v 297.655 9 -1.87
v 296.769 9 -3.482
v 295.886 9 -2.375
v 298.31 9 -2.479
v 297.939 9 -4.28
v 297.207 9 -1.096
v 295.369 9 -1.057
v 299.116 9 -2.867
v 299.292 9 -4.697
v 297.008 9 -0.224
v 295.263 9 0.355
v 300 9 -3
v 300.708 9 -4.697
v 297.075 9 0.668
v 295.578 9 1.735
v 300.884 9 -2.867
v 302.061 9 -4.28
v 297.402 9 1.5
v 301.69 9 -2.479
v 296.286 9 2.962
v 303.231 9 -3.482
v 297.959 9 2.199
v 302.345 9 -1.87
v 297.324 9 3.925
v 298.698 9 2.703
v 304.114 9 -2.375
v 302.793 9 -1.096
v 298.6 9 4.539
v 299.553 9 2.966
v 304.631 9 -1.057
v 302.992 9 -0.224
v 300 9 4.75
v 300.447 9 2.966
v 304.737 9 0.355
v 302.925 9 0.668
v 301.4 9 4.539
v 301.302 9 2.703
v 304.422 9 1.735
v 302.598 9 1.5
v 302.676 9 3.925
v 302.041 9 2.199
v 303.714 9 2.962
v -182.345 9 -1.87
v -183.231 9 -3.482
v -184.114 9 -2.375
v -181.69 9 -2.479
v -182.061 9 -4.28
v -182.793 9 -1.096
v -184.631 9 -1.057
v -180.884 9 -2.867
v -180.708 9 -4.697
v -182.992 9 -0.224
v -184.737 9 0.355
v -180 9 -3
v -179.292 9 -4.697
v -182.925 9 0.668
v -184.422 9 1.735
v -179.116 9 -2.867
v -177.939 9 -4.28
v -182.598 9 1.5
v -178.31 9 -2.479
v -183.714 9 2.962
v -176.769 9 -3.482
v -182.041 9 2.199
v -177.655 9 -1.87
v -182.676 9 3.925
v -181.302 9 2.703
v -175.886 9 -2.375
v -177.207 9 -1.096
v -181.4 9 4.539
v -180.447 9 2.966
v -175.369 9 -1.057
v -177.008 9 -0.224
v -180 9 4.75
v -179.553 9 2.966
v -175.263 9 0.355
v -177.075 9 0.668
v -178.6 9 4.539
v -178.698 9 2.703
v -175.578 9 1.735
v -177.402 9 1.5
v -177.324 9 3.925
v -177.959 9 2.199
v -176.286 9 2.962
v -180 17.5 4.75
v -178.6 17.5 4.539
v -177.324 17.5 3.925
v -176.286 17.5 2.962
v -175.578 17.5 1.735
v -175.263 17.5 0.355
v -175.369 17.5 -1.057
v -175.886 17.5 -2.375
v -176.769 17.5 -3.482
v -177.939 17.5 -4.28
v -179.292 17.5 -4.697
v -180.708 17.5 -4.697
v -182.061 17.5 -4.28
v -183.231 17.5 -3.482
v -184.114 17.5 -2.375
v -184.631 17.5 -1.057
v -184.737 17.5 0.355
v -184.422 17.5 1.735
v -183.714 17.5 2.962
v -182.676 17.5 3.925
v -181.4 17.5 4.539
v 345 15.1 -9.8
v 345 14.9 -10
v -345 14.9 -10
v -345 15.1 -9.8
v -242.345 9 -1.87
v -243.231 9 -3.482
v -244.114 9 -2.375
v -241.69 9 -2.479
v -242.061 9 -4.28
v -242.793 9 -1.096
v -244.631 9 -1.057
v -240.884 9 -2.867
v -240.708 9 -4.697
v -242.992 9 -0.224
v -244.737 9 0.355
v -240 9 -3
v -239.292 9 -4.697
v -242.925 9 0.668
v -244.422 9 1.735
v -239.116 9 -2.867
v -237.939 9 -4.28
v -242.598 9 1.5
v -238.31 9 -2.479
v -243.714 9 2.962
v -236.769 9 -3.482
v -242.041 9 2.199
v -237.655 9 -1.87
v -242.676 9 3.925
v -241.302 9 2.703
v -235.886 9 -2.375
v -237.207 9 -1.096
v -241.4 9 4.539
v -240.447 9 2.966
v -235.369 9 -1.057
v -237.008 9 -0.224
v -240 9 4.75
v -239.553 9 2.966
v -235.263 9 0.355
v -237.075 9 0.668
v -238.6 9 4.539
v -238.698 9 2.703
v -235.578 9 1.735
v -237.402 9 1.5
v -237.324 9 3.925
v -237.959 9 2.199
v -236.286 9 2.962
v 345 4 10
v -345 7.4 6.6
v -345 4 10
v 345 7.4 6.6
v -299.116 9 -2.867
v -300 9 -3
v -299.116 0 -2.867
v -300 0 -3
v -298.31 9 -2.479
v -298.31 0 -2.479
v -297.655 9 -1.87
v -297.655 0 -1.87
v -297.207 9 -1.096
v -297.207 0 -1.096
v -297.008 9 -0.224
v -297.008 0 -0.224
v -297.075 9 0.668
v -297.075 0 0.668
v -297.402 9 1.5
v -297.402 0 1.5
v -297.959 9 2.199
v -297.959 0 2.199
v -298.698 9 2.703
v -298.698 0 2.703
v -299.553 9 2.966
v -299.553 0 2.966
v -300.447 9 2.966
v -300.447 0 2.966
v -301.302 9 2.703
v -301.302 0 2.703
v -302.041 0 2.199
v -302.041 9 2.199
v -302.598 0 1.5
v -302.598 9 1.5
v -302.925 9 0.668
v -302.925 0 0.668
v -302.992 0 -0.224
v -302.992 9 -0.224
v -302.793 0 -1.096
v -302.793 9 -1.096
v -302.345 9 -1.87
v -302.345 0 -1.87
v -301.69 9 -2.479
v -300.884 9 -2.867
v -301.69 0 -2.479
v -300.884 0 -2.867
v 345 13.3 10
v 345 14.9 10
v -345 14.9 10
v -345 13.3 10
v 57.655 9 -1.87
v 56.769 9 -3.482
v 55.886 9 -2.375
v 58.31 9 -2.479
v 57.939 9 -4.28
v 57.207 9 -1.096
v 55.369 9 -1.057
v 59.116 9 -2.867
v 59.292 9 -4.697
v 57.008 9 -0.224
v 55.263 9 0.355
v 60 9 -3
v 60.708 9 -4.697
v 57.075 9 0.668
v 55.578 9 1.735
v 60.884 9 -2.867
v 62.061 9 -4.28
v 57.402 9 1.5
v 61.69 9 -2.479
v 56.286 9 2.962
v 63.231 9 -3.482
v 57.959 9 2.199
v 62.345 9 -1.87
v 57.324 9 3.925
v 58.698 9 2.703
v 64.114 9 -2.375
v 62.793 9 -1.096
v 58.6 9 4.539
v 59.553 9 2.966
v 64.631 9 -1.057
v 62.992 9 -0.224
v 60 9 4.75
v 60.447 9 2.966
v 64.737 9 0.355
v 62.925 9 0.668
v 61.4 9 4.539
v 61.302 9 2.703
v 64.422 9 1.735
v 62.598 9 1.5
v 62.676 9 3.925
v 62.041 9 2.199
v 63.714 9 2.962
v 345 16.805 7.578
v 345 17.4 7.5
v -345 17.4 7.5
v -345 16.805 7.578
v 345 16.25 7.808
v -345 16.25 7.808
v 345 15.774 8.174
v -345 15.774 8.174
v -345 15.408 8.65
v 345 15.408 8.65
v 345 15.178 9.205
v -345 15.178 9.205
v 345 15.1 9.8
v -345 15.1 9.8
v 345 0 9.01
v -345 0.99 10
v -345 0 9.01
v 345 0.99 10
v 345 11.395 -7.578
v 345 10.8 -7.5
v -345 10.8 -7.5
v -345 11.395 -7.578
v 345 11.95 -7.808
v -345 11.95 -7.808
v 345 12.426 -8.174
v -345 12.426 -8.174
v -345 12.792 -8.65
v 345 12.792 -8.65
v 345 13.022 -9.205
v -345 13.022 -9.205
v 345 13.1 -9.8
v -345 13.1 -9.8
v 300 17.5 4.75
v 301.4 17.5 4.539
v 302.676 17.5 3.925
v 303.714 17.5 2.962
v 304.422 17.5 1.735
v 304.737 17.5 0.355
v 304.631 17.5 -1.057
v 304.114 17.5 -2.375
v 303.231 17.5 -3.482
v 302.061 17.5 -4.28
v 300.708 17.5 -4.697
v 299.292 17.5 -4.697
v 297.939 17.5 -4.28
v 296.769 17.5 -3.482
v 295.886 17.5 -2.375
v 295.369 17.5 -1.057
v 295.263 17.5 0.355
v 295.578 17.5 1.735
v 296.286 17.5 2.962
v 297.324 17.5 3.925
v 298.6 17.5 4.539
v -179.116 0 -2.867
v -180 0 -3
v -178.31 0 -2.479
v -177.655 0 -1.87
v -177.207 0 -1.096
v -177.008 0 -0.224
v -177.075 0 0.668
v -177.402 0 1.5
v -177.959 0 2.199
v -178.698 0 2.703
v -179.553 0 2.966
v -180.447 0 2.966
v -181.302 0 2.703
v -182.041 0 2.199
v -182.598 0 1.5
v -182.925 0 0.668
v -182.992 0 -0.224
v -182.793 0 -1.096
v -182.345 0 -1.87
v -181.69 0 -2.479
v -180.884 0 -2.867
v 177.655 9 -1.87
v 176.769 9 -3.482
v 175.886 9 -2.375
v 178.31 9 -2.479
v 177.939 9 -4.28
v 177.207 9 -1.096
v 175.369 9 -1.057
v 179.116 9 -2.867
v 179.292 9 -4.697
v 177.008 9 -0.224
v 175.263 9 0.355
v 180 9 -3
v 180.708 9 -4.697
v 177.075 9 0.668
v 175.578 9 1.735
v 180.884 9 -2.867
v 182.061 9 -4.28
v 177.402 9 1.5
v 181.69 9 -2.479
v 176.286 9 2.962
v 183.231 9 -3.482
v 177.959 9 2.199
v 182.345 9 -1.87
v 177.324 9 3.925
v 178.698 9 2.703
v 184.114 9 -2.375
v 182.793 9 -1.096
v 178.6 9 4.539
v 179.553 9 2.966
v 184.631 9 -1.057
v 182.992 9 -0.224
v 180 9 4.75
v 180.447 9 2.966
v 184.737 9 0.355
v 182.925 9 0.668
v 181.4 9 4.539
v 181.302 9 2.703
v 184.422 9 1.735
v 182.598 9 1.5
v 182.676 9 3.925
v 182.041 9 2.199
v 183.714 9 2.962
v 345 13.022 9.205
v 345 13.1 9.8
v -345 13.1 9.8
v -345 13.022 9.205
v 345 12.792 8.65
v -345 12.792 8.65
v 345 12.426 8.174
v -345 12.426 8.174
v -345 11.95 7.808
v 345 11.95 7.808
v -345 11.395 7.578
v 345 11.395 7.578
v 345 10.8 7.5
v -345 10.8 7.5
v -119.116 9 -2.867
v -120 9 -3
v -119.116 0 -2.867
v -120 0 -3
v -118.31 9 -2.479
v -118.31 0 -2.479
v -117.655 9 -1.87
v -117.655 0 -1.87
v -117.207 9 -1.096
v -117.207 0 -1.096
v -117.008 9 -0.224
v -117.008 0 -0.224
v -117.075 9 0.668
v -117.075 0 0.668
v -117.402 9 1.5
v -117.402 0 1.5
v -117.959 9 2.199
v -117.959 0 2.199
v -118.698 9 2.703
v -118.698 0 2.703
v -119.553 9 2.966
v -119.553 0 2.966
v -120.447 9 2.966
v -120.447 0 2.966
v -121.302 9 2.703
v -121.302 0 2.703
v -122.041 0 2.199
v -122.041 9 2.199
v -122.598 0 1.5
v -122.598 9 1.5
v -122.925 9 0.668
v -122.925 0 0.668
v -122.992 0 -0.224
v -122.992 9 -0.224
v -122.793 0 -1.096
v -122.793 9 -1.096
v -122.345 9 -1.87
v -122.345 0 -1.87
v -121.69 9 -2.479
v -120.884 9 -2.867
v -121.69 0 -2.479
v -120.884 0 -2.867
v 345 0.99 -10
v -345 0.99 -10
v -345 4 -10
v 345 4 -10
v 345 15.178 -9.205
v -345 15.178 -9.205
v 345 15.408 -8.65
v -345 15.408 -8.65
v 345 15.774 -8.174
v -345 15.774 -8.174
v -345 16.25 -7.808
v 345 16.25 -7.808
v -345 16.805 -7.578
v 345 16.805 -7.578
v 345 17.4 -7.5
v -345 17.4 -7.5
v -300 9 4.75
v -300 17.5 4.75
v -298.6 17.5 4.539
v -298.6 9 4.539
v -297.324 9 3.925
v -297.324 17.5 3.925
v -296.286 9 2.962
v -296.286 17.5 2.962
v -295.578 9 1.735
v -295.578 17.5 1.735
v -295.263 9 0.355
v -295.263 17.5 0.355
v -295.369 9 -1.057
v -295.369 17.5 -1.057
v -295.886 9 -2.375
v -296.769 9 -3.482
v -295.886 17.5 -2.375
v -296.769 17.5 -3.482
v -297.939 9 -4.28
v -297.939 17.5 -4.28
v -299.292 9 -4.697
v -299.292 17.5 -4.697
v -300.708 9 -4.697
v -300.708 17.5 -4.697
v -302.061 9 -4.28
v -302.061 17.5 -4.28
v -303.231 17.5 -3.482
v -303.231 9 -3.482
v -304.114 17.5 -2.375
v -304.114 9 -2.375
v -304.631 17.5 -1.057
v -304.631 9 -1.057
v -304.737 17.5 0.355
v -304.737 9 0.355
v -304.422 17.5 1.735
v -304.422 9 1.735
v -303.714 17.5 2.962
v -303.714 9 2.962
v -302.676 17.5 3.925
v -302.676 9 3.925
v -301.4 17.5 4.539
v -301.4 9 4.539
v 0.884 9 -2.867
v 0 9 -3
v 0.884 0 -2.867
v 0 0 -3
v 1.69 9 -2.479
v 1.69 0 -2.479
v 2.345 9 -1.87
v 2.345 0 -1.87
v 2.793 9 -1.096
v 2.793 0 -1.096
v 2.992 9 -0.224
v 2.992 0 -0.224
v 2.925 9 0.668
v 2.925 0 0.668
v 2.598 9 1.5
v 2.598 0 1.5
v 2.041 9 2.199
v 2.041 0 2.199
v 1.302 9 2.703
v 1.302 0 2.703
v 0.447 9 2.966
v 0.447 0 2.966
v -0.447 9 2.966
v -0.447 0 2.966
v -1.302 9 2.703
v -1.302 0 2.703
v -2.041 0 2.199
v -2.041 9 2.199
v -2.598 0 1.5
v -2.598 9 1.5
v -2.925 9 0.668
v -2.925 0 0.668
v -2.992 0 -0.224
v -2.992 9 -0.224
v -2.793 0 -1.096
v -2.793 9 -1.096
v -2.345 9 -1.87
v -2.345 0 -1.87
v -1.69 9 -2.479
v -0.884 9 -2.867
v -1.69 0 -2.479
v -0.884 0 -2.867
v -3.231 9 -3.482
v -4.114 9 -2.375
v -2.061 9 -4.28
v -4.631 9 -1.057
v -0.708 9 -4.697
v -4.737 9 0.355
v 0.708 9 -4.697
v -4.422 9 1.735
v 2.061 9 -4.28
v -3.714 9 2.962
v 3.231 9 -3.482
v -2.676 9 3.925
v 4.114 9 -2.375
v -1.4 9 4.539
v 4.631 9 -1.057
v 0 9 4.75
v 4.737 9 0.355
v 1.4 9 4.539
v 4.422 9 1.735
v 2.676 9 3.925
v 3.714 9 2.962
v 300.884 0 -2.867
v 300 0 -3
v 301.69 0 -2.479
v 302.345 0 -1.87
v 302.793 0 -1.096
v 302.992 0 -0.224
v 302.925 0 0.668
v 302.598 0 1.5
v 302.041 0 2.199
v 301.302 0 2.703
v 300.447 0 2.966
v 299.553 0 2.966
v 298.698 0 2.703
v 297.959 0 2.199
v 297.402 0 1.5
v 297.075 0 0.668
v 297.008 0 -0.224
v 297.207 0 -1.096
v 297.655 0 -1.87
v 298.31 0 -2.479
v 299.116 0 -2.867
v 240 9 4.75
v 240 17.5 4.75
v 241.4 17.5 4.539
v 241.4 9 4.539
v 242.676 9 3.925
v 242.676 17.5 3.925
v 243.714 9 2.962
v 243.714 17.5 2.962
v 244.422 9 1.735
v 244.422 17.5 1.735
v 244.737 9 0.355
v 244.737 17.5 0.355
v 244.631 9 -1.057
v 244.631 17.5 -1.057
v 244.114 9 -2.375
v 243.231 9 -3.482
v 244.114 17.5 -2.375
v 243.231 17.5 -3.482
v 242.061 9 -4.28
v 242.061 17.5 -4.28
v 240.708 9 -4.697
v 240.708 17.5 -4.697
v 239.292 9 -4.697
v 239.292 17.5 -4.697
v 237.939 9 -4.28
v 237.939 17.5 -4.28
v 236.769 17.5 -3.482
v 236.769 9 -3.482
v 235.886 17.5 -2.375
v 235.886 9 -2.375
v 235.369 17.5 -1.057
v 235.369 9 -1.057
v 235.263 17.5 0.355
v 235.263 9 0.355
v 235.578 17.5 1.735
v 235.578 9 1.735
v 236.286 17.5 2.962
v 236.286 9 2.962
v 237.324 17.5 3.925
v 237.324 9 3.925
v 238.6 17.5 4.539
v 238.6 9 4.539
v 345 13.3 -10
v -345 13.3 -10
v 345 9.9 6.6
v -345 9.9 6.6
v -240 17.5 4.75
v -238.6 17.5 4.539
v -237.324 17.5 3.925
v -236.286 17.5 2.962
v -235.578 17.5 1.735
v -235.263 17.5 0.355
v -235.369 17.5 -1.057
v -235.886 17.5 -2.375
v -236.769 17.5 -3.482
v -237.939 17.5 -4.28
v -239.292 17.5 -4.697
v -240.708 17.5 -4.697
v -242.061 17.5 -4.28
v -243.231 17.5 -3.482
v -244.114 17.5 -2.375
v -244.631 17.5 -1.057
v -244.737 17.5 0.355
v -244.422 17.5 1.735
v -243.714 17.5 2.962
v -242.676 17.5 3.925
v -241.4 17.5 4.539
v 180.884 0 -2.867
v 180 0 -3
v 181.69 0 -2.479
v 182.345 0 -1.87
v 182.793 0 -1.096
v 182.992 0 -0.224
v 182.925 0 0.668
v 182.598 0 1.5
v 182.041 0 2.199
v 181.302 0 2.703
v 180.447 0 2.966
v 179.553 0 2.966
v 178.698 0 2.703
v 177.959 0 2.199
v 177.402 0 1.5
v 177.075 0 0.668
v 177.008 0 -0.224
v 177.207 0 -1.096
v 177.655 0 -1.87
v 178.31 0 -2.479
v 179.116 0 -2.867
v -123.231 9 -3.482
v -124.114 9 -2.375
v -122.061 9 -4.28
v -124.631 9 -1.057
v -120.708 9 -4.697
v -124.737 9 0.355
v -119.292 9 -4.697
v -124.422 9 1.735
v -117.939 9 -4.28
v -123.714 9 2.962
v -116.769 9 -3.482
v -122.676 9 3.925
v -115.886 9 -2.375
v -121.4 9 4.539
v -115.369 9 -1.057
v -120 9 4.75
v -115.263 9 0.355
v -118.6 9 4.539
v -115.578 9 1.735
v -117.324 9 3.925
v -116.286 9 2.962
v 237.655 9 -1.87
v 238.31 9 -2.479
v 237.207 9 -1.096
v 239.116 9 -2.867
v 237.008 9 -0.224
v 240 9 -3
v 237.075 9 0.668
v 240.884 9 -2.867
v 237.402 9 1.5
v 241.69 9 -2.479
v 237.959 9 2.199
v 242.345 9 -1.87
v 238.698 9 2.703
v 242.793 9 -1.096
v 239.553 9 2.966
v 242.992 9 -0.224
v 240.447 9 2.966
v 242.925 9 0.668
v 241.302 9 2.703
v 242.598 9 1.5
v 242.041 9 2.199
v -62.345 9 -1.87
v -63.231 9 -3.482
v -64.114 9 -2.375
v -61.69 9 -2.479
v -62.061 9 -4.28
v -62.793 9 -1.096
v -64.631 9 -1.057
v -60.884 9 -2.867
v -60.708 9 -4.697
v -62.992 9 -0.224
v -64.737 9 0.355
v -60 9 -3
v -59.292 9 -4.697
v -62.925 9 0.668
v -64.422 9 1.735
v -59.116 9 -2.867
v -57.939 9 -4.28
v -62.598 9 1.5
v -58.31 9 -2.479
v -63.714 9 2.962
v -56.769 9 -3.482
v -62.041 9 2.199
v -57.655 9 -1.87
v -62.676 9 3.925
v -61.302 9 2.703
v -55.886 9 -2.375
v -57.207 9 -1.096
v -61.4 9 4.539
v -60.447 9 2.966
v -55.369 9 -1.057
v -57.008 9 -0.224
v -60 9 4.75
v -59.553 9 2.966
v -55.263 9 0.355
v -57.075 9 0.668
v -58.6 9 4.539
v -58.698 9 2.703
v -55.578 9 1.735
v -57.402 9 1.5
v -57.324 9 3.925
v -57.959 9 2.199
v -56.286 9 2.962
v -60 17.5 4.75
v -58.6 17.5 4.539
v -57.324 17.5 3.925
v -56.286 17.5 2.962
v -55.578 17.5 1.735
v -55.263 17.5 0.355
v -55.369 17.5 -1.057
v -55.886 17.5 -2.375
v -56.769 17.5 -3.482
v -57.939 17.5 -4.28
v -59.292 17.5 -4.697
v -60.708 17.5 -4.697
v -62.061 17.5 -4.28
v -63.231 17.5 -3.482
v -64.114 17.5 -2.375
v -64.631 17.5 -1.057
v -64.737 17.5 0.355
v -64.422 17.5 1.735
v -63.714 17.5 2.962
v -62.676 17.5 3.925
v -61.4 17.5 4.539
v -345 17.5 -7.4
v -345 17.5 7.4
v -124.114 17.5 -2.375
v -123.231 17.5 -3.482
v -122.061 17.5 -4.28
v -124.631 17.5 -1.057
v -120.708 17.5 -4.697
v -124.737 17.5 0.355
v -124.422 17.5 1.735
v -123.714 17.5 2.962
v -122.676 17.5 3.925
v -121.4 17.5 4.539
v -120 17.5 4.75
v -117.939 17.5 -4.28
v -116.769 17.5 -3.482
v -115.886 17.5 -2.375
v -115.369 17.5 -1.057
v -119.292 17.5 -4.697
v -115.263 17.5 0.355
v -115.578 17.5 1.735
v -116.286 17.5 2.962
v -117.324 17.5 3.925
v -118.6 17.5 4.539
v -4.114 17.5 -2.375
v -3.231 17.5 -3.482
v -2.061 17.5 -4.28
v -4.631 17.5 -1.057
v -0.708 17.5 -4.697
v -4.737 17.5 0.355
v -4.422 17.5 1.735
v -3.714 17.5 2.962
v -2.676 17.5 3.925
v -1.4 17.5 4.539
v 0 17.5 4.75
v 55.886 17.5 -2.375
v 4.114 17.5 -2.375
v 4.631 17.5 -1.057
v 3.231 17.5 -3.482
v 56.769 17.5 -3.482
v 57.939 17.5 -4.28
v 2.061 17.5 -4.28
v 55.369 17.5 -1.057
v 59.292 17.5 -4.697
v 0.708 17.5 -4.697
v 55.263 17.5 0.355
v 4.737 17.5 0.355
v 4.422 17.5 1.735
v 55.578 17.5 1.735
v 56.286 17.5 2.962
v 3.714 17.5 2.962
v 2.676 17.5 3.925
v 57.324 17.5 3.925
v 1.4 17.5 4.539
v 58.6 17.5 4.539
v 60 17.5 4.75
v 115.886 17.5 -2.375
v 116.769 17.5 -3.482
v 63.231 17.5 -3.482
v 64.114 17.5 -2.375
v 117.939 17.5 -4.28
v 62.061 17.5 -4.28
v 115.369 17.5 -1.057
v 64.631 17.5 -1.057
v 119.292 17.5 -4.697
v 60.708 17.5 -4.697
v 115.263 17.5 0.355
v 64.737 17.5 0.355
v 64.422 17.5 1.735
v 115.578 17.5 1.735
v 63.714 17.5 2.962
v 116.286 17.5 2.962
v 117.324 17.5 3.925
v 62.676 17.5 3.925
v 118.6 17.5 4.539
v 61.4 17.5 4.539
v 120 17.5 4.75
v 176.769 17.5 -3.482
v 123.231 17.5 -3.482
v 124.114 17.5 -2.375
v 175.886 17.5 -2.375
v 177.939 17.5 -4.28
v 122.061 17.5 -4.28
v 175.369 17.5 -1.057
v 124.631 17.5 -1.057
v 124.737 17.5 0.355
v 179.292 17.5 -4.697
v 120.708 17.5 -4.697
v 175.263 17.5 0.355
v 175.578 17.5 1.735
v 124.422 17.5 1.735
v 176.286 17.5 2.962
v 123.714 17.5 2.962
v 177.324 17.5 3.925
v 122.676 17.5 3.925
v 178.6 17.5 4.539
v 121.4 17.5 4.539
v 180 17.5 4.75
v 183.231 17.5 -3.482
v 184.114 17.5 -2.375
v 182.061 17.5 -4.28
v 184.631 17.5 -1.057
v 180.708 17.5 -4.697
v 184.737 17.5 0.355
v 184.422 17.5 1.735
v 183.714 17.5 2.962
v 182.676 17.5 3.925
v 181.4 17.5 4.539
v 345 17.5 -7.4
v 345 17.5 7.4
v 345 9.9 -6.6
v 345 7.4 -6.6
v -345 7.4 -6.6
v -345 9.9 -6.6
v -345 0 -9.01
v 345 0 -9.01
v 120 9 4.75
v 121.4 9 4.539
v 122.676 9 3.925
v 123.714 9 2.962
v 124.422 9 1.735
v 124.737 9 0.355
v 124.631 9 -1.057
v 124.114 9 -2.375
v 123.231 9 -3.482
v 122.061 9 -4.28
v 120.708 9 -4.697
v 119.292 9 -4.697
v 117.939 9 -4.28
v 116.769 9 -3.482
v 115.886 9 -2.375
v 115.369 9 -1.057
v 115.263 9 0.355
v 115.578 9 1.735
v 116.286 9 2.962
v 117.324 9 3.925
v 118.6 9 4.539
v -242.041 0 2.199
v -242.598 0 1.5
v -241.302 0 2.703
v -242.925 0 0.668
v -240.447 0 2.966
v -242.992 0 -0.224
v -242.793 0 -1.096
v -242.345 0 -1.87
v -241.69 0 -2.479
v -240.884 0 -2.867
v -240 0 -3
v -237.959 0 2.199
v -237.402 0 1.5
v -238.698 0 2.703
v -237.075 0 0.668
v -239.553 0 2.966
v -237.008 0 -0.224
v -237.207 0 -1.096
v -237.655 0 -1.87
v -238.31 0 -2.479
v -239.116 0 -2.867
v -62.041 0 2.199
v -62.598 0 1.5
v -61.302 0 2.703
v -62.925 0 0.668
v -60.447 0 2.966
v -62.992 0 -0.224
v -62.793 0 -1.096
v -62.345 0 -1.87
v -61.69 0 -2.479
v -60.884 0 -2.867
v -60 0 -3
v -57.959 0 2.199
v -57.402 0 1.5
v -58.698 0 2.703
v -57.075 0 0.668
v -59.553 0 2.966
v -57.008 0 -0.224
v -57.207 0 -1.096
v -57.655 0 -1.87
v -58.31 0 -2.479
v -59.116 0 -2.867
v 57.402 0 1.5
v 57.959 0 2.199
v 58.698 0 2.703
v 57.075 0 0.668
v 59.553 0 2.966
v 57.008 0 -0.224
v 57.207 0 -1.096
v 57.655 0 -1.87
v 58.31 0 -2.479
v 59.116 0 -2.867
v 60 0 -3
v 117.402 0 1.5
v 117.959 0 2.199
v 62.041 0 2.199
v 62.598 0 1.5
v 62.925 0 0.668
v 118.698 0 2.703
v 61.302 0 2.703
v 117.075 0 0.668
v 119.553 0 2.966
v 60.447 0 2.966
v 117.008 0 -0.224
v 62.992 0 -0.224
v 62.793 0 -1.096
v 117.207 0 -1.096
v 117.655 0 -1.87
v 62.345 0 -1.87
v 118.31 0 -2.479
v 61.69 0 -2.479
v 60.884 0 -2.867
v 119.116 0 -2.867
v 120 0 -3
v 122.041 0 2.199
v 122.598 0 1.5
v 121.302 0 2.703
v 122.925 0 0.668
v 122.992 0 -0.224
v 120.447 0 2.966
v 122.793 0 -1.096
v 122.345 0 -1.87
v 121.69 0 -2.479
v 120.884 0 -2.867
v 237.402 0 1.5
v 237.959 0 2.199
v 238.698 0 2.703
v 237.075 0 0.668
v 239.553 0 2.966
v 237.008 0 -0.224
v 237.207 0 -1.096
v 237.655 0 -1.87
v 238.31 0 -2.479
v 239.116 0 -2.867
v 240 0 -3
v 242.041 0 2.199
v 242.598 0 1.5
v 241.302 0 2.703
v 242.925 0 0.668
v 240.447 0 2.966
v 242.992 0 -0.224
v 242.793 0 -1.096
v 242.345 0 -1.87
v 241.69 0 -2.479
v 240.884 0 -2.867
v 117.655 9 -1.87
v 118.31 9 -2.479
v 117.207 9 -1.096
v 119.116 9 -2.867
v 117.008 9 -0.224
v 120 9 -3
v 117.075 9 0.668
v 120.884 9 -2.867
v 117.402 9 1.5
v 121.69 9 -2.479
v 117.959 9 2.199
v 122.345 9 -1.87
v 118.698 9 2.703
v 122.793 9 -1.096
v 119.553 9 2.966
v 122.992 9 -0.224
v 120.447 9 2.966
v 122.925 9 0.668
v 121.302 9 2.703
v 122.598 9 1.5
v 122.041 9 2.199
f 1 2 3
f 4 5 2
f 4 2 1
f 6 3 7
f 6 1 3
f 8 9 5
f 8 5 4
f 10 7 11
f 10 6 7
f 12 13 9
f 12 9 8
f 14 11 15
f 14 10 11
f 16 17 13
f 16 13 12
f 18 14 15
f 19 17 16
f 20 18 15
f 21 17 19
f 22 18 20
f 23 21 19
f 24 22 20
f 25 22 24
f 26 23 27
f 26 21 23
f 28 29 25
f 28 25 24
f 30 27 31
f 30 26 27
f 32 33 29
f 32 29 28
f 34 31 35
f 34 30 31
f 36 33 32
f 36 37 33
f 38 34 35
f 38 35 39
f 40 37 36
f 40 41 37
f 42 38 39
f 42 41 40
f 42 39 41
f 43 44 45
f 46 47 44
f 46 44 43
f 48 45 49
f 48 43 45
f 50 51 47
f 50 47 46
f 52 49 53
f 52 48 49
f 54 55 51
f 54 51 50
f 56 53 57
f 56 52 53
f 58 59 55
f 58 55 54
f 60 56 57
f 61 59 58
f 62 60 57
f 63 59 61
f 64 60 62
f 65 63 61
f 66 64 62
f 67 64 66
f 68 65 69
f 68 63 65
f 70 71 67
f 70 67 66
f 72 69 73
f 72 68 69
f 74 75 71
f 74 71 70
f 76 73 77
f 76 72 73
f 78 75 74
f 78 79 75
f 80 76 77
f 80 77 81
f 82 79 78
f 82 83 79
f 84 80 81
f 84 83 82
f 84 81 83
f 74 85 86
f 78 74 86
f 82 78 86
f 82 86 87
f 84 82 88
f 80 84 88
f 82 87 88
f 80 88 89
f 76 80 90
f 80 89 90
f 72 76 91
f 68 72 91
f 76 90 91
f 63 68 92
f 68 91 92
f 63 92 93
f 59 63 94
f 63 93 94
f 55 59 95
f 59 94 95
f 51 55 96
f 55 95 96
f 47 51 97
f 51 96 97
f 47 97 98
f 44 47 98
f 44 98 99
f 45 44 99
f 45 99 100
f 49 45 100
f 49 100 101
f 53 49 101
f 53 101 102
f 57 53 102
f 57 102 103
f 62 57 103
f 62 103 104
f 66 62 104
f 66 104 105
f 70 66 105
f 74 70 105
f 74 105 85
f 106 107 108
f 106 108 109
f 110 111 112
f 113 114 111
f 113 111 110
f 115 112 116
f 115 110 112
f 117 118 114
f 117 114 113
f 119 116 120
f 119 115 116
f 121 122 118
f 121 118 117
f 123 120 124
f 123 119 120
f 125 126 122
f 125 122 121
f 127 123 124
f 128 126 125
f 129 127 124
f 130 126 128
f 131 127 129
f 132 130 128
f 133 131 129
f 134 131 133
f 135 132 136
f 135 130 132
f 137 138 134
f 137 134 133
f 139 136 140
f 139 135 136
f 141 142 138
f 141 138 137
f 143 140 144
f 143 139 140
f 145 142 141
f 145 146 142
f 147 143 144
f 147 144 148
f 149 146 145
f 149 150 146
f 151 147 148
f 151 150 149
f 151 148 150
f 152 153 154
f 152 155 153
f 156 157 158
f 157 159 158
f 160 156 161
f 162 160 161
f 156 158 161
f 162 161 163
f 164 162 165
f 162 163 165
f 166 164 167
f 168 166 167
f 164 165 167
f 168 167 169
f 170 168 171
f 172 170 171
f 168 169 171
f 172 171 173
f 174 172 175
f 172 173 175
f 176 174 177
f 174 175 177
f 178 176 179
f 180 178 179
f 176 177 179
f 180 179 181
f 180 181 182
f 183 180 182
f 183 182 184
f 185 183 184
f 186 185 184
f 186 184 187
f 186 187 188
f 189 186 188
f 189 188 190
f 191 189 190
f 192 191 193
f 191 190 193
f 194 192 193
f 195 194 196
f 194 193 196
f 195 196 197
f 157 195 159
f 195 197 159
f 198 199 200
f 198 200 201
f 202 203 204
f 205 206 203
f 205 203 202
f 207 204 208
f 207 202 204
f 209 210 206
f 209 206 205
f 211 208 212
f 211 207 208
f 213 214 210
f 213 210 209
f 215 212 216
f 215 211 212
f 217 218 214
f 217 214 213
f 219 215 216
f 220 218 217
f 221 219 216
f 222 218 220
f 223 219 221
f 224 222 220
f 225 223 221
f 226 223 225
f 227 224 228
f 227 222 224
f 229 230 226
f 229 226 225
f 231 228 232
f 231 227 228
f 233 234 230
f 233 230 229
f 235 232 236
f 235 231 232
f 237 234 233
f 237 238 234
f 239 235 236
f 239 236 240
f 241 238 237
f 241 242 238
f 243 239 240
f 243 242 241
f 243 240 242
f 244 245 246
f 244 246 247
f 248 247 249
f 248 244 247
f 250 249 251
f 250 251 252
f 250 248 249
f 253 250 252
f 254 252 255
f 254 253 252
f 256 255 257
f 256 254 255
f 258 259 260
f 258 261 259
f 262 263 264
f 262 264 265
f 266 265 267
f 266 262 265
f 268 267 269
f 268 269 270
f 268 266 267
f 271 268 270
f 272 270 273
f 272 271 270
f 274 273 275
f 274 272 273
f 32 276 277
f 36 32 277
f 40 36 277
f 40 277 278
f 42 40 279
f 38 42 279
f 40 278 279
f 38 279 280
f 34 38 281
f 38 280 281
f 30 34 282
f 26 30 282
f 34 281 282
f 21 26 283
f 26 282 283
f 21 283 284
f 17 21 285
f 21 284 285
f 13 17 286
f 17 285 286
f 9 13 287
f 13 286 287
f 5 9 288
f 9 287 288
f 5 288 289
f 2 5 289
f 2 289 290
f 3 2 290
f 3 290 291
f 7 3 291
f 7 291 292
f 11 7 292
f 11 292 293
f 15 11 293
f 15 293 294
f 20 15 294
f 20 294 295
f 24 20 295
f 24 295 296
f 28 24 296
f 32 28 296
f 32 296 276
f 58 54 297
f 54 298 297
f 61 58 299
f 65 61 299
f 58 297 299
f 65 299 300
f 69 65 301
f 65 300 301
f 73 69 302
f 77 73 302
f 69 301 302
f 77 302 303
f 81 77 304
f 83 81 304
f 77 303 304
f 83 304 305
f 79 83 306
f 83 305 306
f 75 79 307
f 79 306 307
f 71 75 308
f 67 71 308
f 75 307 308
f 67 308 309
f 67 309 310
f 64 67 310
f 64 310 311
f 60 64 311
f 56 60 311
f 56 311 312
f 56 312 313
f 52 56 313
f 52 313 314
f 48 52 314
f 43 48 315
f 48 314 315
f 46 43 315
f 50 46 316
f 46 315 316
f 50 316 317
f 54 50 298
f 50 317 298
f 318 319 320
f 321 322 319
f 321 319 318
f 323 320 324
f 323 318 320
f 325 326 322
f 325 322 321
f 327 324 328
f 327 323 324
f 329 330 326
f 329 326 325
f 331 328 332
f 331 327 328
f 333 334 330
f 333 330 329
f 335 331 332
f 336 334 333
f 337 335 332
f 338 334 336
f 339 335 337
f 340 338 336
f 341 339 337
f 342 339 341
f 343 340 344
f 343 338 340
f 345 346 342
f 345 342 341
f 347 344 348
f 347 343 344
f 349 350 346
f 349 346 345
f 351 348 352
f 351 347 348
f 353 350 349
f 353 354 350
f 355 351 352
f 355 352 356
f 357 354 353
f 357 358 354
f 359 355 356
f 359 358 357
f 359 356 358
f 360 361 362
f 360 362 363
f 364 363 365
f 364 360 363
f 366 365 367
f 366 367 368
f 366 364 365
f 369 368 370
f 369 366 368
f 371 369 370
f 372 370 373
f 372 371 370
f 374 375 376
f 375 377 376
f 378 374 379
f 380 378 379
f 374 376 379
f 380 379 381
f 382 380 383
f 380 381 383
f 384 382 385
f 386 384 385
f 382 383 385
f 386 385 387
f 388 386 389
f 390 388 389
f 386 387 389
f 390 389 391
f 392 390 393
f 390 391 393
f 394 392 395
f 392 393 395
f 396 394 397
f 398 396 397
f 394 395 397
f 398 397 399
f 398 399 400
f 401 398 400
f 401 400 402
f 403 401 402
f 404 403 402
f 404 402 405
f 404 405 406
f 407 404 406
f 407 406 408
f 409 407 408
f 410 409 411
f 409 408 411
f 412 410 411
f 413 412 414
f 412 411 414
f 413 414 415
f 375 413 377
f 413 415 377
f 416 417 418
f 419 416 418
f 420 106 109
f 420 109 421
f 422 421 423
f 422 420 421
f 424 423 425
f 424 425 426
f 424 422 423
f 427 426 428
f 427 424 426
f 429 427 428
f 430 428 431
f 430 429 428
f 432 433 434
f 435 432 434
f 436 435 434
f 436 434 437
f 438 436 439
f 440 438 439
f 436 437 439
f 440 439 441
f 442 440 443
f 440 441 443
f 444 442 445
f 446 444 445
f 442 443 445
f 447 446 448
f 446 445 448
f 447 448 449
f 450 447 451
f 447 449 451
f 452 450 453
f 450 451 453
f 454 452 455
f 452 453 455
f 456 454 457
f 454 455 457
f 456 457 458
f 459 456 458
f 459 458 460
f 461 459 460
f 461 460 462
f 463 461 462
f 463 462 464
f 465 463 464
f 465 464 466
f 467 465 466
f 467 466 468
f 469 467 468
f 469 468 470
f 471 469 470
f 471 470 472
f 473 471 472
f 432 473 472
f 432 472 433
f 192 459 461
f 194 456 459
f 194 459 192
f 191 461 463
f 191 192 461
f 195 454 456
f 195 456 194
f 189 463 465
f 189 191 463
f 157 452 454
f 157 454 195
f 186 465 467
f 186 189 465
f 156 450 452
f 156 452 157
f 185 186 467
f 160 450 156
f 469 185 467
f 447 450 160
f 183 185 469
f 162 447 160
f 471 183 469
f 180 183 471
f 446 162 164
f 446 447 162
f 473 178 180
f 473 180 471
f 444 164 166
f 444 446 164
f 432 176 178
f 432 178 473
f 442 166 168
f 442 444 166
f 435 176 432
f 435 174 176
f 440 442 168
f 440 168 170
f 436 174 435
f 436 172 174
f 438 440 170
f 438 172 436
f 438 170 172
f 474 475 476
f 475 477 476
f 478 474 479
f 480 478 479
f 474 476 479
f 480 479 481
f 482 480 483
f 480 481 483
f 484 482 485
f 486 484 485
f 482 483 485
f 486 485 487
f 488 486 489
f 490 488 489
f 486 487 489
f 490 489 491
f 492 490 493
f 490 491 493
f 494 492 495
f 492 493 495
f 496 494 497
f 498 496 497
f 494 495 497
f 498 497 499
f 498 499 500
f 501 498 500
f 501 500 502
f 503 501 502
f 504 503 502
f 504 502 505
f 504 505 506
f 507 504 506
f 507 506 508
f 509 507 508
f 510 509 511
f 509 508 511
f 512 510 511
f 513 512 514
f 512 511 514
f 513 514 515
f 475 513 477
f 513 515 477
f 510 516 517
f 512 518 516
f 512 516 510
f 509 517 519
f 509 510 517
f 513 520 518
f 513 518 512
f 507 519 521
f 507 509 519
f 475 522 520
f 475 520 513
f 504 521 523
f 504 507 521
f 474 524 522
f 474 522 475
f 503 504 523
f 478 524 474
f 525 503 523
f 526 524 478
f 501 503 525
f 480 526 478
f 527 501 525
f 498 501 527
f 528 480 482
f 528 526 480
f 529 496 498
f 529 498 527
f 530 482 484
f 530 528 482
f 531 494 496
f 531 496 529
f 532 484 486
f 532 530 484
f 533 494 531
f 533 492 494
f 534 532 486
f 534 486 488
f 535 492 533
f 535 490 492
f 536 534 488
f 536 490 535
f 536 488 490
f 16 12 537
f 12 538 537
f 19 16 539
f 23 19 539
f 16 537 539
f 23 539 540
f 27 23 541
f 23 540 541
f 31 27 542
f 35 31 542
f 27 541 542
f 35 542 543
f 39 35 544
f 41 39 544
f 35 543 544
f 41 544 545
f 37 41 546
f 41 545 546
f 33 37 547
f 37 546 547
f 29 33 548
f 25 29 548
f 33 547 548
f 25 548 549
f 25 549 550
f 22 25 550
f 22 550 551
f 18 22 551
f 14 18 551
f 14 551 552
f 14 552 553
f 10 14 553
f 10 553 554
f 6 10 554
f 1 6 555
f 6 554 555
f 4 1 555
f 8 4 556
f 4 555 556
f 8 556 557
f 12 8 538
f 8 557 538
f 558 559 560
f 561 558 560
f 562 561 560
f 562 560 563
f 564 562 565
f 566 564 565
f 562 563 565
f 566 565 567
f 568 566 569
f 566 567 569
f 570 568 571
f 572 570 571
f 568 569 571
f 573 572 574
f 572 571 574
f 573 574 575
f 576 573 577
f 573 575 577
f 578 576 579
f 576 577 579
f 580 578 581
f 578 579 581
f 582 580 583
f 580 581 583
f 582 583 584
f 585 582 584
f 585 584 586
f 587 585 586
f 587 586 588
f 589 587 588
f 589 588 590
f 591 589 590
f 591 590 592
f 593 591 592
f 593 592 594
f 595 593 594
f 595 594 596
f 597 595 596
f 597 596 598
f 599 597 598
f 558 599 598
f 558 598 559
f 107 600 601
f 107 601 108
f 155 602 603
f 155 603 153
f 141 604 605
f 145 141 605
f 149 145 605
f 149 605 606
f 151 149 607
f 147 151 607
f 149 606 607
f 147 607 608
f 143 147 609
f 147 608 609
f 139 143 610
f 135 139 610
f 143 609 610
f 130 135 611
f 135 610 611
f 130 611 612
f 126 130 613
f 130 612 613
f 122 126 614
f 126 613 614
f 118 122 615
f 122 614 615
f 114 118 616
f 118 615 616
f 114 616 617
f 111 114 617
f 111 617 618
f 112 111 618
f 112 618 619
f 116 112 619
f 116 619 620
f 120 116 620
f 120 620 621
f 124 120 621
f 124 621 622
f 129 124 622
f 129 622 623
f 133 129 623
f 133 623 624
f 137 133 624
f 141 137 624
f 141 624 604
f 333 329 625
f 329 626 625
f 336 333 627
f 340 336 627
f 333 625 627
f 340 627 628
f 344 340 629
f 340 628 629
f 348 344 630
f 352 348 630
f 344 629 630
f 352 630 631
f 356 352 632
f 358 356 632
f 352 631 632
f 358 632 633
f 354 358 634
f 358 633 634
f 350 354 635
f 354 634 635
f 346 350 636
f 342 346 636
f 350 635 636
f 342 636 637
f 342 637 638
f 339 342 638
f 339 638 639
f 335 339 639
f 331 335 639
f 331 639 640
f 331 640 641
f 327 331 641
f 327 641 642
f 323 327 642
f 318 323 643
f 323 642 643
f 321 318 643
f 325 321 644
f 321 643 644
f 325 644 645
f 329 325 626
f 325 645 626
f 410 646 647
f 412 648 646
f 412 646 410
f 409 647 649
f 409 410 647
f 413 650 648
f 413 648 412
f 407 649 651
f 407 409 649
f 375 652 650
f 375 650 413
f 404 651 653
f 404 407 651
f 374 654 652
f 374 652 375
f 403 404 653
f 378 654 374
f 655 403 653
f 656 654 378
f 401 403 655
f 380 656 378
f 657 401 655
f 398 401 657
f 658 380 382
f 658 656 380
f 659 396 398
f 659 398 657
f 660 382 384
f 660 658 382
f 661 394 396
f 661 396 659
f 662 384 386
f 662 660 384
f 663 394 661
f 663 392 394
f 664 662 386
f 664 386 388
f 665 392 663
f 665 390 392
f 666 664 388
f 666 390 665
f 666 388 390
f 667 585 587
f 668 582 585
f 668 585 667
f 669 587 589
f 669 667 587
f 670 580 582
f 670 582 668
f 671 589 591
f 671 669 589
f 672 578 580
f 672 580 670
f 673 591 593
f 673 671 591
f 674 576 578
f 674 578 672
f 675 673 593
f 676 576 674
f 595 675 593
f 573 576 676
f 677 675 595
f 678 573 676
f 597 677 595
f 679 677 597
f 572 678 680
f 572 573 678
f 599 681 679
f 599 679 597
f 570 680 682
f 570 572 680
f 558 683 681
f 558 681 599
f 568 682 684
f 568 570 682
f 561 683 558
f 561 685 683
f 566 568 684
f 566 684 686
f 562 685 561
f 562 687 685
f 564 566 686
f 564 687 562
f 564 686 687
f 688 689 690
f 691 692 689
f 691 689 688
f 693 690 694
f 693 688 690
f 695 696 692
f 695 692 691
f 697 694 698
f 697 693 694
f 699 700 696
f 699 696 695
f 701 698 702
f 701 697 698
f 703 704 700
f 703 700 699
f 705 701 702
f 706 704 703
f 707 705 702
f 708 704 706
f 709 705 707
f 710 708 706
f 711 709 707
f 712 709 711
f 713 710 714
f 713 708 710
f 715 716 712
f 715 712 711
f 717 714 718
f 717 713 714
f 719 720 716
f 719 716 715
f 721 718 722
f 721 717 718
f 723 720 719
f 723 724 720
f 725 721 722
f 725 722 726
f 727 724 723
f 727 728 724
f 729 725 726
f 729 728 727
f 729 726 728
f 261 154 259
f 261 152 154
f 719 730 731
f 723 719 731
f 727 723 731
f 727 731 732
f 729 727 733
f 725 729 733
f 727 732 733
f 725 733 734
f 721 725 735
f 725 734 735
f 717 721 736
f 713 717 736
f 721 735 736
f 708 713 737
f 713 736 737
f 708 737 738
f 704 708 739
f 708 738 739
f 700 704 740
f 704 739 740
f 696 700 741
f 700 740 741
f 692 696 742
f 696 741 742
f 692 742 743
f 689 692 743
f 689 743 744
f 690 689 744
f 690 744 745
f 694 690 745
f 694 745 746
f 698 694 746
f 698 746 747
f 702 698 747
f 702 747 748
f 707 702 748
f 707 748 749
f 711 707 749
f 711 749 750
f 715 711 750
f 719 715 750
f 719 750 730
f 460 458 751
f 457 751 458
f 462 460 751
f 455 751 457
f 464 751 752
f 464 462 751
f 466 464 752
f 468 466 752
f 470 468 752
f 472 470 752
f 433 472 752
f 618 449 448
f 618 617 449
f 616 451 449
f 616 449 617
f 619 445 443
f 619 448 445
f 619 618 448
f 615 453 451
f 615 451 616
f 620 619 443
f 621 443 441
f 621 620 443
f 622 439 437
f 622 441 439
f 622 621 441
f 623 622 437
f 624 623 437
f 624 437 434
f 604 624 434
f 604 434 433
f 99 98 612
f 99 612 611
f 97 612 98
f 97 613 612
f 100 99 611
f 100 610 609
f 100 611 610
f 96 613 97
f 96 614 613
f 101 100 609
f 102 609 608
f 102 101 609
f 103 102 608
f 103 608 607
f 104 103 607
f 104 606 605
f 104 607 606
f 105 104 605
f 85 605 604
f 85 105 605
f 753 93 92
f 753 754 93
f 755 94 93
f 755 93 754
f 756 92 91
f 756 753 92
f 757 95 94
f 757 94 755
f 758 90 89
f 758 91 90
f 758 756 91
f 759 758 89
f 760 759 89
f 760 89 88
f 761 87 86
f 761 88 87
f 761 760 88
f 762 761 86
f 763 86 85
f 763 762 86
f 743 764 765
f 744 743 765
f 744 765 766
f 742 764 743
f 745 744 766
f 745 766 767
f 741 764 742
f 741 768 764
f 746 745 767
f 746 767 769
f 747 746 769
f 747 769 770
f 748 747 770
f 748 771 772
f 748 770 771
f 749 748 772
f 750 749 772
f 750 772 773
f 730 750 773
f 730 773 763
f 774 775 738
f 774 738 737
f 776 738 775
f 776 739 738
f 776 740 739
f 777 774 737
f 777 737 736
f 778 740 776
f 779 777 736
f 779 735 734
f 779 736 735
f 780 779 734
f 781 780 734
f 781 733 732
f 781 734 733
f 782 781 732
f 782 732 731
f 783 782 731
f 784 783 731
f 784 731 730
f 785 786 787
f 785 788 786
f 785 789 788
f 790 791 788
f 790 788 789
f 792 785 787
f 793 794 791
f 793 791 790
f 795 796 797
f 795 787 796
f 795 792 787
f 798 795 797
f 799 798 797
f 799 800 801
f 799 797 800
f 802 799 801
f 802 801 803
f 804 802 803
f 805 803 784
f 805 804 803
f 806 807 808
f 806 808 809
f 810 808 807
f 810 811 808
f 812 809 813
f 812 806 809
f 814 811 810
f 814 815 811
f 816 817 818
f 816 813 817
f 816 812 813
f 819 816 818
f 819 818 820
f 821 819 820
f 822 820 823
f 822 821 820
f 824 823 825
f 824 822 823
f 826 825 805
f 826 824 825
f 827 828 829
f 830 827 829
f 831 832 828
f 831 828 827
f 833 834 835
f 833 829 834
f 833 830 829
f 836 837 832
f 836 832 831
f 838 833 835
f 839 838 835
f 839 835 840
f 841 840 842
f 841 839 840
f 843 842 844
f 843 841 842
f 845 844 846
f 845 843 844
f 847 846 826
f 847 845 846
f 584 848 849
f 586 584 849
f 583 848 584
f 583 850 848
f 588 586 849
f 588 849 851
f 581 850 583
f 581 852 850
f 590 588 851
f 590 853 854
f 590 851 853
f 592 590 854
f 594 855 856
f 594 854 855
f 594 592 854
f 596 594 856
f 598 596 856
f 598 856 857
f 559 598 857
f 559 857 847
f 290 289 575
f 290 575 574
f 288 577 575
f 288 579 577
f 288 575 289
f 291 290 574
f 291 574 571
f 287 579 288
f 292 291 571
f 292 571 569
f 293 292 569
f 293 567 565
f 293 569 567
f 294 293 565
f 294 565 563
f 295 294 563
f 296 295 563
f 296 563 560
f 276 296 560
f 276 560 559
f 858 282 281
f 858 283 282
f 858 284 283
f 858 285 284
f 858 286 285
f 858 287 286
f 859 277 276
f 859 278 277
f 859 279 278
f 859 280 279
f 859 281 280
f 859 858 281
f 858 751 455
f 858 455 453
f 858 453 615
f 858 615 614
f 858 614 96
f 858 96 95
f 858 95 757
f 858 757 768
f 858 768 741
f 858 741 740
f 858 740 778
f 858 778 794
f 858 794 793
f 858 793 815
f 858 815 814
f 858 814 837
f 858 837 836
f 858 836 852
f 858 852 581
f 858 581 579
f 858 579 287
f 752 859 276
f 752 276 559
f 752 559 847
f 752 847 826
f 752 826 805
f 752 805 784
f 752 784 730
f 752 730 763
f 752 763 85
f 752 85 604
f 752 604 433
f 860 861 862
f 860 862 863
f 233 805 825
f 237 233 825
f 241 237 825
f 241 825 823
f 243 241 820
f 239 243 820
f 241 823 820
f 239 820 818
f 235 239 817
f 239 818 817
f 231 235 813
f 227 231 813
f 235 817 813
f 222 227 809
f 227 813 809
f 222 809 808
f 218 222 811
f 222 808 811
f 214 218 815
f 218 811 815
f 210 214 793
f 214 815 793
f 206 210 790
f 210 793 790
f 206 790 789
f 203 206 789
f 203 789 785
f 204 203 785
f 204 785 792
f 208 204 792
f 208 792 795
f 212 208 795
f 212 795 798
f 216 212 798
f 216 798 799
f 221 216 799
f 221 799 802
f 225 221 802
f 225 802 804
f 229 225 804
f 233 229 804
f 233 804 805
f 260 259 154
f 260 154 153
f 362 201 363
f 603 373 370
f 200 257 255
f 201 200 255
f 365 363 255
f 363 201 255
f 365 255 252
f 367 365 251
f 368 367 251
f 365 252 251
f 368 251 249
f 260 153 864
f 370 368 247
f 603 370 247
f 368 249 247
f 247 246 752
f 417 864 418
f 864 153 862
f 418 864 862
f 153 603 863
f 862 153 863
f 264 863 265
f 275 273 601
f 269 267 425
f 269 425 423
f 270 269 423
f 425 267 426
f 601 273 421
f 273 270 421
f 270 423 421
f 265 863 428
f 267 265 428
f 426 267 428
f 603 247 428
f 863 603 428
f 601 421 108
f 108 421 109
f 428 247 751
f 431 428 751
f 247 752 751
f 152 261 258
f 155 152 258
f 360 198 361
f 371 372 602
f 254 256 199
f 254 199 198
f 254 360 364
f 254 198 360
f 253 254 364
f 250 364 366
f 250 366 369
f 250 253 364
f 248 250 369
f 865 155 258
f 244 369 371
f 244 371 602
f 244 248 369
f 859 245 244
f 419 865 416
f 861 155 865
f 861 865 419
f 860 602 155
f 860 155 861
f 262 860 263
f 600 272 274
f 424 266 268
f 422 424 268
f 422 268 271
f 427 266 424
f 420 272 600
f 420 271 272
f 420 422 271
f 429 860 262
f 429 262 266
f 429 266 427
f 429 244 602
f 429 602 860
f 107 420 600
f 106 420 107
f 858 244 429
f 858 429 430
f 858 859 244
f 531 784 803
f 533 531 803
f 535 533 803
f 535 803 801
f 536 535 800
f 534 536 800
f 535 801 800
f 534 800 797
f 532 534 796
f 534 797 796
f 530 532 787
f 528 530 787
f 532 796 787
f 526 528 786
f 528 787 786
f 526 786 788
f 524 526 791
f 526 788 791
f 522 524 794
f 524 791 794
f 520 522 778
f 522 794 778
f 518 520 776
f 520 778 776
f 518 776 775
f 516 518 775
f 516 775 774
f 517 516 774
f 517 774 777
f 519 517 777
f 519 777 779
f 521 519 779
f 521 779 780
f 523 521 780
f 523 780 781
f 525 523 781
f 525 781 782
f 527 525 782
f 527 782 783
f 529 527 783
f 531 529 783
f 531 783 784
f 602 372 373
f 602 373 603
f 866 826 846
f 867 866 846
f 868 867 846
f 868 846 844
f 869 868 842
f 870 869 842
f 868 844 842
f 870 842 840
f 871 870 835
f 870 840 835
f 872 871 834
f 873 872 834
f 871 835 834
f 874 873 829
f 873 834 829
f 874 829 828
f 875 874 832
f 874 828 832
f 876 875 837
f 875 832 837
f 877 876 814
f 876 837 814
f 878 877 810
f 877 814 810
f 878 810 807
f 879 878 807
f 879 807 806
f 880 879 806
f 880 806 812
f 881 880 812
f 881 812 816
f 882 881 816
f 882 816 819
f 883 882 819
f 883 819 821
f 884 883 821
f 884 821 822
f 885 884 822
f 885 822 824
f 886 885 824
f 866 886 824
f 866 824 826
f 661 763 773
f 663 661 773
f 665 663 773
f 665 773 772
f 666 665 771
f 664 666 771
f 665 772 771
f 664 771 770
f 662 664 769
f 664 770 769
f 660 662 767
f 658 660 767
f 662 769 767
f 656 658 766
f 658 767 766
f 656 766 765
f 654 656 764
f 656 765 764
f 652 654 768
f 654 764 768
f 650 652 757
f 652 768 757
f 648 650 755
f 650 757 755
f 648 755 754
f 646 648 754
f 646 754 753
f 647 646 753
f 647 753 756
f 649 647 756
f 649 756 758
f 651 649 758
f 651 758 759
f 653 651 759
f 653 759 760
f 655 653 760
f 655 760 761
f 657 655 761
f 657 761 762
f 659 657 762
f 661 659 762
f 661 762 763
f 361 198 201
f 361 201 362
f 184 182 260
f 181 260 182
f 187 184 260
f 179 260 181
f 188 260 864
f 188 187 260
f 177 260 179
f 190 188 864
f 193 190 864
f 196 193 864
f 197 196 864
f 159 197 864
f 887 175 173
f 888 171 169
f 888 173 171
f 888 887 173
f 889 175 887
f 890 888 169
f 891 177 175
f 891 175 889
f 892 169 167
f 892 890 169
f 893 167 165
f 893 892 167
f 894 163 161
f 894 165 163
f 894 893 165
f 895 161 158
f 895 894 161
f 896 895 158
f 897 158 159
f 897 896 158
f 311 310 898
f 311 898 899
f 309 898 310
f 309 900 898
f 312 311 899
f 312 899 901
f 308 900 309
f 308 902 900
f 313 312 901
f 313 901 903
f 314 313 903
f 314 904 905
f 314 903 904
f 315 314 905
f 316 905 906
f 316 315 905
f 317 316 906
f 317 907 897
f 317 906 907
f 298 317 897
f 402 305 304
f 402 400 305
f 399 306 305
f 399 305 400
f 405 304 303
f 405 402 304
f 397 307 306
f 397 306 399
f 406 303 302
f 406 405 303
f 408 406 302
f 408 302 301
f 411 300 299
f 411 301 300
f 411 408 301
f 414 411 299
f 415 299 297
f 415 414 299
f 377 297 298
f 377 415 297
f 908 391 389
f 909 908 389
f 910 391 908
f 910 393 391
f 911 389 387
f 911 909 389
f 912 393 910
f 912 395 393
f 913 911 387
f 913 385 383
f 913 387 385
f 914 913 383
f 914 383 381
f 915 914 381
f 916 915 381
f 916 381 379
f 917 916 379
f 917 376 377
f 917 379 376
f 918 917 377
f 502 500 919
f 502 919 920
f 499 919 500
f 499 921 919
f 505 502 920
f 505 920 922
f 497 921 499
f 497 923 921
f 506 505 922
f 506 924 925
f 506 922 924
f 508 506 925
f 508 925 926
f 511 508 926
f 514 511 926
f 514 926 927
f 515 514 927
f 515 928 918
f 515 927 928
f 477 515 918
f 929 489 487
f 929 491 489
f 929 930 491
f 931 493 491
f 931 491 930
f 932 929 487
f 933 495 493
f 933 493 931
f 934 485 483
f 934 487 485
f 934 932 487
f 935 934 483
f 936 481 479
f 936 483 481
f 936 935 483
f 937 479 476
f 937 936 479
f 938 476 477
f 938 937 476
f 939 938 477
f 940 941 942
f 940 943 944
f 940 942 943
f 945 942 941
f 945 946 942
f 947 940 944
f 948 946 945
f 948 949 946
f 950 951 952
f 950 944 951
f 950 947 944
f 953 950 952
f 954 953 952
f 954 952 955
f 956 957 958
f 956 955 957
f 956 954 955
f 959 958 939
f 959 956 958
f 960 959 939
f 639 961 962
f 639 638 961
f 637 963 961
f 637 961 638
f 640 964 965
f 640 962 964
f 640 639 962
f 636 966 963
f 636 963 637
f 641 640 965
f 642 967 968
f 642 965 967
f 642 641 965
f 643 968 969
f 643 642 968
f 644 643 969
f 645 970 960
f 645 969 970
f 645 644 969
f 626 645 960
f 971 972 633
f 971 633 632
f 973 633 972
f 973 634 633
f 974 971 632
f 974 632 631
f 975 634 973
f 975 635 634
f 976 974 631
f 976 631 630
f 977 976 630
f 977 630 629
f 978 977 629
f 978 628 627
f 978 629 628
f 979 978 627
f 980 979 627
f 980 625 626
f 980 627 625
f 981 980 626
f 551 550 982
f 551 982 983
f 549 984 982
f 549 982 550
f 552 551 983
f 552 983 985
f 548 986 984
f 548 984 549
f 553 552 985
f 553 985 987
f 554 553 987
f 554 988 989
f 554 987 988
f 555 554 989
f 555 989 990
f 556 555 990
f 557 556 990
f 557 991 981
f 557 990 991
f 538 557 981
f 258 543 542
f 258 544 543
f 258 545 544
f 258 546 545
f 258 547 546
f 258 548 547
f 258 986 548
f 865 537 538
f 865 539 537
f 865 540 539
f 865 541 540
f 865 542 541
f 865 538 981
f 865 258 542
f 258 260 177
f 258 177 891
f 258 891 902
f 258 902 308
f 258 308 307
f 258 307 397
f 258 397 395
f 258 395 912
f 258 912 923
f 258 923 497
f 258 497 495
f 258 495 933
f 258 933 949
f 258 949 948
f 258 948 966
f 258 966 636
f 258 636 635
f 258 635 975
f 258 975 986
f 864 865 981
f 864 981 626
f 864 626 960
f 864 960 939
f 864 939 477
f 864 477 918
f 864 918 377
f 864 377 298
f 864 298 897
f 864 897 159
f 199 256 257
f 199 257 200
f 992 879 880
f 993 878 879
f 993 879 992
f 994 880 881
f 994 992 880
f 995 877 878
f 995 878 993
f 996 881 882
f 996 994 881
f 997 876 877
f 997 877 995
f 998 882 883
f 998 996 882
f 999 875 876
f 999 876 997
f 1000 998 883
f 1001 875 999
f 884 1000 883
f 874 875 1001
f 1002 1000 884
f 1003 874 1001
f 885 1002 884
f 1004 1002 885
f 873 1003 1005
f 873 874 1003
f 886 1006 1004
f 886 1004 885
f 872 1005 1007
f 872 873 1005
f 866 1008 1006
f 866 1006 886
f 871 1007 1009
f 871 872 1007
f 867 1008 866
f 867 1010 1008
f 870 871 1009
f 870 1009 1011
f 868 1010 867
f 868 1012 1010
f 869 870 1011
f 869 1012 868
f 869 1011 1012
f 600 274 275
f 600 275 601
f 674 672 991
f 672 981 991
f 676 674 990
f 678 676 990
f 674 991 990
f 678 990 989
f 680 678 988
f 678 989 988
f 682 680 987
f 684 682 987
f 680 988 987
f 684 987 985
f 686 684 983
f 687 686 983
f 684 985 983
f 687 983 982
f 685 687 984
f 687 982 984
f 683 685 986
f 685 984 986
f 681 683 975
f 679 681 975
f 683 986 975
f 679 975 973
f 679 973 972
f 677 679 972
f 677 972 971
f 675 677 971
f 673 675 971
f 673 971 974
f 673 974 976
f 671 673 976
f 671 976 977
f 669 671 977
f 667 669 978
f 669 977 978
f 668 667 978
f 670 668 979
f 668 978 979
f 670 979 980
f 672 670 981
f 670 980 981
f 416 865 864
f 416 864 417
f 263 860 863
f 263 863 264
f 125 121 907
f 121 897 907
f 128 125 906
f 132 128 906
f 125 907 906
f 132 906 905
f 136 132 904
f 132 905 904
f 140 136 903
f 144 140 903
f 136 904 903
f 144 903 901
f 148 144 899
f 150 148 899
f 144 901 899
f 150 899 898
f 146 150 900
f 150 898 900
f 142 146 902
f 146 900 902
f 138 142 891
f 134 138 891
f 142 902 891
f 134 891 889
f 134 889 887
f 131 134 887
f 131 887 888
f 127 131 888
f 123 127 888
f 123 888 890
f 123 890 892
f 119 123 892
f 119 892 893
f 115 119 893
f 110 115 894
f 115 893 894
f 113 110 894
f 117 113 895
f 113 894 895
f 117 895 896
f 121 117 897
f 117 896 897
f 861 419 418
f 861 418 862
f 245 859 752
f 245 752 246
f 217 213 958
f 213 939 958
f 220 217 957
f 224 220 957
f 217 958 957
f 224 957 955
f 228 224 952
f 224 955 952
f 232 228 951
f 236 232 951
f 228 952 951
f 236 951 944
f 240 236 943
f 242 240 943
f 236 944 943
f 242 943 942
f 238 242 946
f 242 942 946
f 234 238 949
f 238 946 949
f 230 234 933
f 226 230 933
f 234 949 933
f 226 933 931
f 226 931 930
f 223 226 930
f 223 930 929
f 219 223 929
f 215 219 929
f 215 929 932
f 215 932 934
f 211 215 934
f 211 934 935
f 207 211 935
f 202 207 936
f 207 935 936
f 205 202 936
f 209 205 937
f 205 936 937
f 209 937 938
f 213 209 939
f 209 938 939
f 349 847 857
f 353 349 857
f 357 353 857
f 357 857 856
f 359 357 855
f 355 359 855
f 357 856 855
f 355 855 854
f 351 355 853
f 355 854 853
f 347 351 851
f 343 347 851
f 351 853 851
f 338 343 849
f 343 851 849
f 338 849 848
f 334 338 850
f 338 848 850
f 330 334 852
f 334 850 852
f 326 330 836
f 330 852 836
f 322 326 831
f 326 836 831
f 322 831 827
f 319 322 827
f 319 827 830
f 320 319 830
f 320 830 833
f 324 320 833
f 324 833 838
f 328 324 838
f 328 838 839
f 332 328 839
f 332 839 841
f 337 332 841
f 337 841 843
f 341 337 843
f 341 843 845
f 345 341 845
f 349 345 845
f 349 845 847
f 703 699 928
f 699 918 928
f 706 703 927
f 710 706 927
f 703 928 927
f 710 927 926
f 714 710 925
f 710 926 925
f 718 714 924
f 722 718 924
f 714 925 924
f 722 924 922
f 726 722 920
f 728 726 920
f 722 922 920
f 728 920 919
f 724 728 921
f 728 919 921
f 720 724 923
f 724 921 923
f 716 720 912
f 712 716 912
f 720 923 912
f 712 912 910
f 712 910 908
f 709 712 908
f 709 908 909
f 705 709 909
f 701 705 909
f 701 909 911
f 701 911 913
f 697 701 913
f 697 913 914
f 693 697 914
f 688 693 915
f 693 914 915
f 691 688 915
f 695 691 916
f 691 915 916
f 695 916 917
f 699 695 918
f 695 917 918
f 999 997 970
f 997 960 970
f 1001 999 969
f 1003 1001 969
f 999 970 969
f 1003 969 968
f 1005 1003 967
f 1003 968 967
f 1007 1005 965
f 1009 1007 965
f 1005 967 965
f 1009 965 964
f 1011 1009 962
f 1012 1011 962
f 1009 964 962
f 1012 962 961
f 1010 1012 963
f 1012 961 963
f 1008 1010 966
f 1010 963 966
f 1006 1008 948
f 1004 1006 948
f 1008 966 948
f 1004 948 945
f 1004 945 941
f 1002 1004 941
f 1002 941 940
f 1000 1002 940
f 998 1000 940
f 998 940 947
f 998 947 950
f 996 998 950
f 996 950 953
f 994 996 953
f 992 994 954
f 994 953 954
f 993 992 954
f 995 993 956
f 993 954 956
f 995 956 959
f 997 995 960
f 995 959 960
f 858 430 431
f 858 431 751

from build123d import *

# Parameters (mm, degrees)
EXTRUDE_1_DEPTH                  = 345
HOLE_WIZARD_M6_78051_D           = 6
HOLE_WIZARD_M6_78051_CBORE_D     = 9.5
HOLE_WIZARD_M6_78051_CBORE_DEPTH = 8.5
PATTERN_LINEAR_1_COUNT           = 6
PATTERN_LINEAR_1_PITCH           = 60
PATTERN_LINEAR_2_COUNT           = 6
PATTERN_LINEAR_2_PITCH           = 60


with BuildPart() as part:
    # Эскиз1 → Бобышка-Вытянуть1 (new, symmetric)
    with BuildSketch(Plane(origin=(0, 0, 0), x_dir=(0, 0, -1), z_dir=(1, 0, 0))):
        with BuildLine():
            Line((-10, 0.989949494), (-9.010050506, 0))
            Line((-9.010050506, 0), (9.010050506, 0))
            Line((9.010050506, 0), (10, 0.989949494))
            Line((10, 0.989949494), (10, 4))
            Line((10, 4), (6.6, 7.4))
            Line((6.6, 7.4), (6.6, 9.9))
            Line((6.6, 9.9), (7.5, 10.8))
            ThreePointArc((7.5, 10.8), (8.173654403, 12.426345597), (9.8, 13.1))
            Line((9.8, 13.1), (10, 13.3))
            Line((10, 13.3), (10, 14.9))
            Line((10, 14.9), (9.8, 15.1))
            ThreePointArc((9.8, 15.1), (8.173654403, 15.773654403), (7.5, 17.4))
            Line((7.5, 17.4), (7.4, 17.5))
            Line((7.4, 17.5), (-7.4, 17.5))
            Line((-7.4, 17.5), (-7.5, 17.4))
            ThreePointArc((-7.5, 17.4), (-8.173654403, 15.773654403), (-9.8, 15.1))
            Line((-9.8, 15.1), (-10, 14.9))
            Line((-10, 14.9), (-10, 13.3))
            Line((-10, 13.3), (-9.8, 13.1))
            ThreePointArc((-9.8, 13.1), (-8.173654403, 12.426345597), (-7.5, 10.8))
            Line((-7.5, 10.8), (-6.6, 9.9))
            Line((-6.6, 9.9), (-6.6, 7.4))
            Line((-6.6, 7.4), (-10, 4))
            Line((-10, 4), (-10, 0.989949494))
        make_face()
    extrude(amount=EXTRUDE_1_DEPTH, both=True)

    # Цековка M6 для болта с шестигранной головкой класса А ГОСТ 78051 (through all)
    with Locations(Plane.ZX.offset(17.5)):
        with Locations((0, 0)):
            hole_wizard_m6_78051 = CounterBoreHole(HOLE_WIZARD_M6_78051_D / 2, HOLE_WIZARD_M6_78051_CBORE_D / 2, HOLE_WIZARD_M6_78051_CBORE_DEPTH)

    # Линейный массив1: Цековка M6 для болта с шестигранной головкой класса А ГОСТ 78051 ×6
    with Locations(*[(i * PATTERN_LINEAR_1_PITCH, 0, 0) for i in range(1, PATTERN_LINEAR_1_COUNT)]):
        add(hole_wizard_m6_78051, mode=Mode.SUBTRACT)

    # Линейный массив2: Цековка M6 для болта с шестигранной головкой класса А ГОСТ 78051 ×6
    with Locations(*[(-i * PATTERN_LINEAR_2_PITCH, 0, 0) for i in range(1, PATTERN_LINEAR_2_COUNT)]):
        add(hole_wizard_m6_78051, mode=Mode.SUBTRACT)


solid = part.part
